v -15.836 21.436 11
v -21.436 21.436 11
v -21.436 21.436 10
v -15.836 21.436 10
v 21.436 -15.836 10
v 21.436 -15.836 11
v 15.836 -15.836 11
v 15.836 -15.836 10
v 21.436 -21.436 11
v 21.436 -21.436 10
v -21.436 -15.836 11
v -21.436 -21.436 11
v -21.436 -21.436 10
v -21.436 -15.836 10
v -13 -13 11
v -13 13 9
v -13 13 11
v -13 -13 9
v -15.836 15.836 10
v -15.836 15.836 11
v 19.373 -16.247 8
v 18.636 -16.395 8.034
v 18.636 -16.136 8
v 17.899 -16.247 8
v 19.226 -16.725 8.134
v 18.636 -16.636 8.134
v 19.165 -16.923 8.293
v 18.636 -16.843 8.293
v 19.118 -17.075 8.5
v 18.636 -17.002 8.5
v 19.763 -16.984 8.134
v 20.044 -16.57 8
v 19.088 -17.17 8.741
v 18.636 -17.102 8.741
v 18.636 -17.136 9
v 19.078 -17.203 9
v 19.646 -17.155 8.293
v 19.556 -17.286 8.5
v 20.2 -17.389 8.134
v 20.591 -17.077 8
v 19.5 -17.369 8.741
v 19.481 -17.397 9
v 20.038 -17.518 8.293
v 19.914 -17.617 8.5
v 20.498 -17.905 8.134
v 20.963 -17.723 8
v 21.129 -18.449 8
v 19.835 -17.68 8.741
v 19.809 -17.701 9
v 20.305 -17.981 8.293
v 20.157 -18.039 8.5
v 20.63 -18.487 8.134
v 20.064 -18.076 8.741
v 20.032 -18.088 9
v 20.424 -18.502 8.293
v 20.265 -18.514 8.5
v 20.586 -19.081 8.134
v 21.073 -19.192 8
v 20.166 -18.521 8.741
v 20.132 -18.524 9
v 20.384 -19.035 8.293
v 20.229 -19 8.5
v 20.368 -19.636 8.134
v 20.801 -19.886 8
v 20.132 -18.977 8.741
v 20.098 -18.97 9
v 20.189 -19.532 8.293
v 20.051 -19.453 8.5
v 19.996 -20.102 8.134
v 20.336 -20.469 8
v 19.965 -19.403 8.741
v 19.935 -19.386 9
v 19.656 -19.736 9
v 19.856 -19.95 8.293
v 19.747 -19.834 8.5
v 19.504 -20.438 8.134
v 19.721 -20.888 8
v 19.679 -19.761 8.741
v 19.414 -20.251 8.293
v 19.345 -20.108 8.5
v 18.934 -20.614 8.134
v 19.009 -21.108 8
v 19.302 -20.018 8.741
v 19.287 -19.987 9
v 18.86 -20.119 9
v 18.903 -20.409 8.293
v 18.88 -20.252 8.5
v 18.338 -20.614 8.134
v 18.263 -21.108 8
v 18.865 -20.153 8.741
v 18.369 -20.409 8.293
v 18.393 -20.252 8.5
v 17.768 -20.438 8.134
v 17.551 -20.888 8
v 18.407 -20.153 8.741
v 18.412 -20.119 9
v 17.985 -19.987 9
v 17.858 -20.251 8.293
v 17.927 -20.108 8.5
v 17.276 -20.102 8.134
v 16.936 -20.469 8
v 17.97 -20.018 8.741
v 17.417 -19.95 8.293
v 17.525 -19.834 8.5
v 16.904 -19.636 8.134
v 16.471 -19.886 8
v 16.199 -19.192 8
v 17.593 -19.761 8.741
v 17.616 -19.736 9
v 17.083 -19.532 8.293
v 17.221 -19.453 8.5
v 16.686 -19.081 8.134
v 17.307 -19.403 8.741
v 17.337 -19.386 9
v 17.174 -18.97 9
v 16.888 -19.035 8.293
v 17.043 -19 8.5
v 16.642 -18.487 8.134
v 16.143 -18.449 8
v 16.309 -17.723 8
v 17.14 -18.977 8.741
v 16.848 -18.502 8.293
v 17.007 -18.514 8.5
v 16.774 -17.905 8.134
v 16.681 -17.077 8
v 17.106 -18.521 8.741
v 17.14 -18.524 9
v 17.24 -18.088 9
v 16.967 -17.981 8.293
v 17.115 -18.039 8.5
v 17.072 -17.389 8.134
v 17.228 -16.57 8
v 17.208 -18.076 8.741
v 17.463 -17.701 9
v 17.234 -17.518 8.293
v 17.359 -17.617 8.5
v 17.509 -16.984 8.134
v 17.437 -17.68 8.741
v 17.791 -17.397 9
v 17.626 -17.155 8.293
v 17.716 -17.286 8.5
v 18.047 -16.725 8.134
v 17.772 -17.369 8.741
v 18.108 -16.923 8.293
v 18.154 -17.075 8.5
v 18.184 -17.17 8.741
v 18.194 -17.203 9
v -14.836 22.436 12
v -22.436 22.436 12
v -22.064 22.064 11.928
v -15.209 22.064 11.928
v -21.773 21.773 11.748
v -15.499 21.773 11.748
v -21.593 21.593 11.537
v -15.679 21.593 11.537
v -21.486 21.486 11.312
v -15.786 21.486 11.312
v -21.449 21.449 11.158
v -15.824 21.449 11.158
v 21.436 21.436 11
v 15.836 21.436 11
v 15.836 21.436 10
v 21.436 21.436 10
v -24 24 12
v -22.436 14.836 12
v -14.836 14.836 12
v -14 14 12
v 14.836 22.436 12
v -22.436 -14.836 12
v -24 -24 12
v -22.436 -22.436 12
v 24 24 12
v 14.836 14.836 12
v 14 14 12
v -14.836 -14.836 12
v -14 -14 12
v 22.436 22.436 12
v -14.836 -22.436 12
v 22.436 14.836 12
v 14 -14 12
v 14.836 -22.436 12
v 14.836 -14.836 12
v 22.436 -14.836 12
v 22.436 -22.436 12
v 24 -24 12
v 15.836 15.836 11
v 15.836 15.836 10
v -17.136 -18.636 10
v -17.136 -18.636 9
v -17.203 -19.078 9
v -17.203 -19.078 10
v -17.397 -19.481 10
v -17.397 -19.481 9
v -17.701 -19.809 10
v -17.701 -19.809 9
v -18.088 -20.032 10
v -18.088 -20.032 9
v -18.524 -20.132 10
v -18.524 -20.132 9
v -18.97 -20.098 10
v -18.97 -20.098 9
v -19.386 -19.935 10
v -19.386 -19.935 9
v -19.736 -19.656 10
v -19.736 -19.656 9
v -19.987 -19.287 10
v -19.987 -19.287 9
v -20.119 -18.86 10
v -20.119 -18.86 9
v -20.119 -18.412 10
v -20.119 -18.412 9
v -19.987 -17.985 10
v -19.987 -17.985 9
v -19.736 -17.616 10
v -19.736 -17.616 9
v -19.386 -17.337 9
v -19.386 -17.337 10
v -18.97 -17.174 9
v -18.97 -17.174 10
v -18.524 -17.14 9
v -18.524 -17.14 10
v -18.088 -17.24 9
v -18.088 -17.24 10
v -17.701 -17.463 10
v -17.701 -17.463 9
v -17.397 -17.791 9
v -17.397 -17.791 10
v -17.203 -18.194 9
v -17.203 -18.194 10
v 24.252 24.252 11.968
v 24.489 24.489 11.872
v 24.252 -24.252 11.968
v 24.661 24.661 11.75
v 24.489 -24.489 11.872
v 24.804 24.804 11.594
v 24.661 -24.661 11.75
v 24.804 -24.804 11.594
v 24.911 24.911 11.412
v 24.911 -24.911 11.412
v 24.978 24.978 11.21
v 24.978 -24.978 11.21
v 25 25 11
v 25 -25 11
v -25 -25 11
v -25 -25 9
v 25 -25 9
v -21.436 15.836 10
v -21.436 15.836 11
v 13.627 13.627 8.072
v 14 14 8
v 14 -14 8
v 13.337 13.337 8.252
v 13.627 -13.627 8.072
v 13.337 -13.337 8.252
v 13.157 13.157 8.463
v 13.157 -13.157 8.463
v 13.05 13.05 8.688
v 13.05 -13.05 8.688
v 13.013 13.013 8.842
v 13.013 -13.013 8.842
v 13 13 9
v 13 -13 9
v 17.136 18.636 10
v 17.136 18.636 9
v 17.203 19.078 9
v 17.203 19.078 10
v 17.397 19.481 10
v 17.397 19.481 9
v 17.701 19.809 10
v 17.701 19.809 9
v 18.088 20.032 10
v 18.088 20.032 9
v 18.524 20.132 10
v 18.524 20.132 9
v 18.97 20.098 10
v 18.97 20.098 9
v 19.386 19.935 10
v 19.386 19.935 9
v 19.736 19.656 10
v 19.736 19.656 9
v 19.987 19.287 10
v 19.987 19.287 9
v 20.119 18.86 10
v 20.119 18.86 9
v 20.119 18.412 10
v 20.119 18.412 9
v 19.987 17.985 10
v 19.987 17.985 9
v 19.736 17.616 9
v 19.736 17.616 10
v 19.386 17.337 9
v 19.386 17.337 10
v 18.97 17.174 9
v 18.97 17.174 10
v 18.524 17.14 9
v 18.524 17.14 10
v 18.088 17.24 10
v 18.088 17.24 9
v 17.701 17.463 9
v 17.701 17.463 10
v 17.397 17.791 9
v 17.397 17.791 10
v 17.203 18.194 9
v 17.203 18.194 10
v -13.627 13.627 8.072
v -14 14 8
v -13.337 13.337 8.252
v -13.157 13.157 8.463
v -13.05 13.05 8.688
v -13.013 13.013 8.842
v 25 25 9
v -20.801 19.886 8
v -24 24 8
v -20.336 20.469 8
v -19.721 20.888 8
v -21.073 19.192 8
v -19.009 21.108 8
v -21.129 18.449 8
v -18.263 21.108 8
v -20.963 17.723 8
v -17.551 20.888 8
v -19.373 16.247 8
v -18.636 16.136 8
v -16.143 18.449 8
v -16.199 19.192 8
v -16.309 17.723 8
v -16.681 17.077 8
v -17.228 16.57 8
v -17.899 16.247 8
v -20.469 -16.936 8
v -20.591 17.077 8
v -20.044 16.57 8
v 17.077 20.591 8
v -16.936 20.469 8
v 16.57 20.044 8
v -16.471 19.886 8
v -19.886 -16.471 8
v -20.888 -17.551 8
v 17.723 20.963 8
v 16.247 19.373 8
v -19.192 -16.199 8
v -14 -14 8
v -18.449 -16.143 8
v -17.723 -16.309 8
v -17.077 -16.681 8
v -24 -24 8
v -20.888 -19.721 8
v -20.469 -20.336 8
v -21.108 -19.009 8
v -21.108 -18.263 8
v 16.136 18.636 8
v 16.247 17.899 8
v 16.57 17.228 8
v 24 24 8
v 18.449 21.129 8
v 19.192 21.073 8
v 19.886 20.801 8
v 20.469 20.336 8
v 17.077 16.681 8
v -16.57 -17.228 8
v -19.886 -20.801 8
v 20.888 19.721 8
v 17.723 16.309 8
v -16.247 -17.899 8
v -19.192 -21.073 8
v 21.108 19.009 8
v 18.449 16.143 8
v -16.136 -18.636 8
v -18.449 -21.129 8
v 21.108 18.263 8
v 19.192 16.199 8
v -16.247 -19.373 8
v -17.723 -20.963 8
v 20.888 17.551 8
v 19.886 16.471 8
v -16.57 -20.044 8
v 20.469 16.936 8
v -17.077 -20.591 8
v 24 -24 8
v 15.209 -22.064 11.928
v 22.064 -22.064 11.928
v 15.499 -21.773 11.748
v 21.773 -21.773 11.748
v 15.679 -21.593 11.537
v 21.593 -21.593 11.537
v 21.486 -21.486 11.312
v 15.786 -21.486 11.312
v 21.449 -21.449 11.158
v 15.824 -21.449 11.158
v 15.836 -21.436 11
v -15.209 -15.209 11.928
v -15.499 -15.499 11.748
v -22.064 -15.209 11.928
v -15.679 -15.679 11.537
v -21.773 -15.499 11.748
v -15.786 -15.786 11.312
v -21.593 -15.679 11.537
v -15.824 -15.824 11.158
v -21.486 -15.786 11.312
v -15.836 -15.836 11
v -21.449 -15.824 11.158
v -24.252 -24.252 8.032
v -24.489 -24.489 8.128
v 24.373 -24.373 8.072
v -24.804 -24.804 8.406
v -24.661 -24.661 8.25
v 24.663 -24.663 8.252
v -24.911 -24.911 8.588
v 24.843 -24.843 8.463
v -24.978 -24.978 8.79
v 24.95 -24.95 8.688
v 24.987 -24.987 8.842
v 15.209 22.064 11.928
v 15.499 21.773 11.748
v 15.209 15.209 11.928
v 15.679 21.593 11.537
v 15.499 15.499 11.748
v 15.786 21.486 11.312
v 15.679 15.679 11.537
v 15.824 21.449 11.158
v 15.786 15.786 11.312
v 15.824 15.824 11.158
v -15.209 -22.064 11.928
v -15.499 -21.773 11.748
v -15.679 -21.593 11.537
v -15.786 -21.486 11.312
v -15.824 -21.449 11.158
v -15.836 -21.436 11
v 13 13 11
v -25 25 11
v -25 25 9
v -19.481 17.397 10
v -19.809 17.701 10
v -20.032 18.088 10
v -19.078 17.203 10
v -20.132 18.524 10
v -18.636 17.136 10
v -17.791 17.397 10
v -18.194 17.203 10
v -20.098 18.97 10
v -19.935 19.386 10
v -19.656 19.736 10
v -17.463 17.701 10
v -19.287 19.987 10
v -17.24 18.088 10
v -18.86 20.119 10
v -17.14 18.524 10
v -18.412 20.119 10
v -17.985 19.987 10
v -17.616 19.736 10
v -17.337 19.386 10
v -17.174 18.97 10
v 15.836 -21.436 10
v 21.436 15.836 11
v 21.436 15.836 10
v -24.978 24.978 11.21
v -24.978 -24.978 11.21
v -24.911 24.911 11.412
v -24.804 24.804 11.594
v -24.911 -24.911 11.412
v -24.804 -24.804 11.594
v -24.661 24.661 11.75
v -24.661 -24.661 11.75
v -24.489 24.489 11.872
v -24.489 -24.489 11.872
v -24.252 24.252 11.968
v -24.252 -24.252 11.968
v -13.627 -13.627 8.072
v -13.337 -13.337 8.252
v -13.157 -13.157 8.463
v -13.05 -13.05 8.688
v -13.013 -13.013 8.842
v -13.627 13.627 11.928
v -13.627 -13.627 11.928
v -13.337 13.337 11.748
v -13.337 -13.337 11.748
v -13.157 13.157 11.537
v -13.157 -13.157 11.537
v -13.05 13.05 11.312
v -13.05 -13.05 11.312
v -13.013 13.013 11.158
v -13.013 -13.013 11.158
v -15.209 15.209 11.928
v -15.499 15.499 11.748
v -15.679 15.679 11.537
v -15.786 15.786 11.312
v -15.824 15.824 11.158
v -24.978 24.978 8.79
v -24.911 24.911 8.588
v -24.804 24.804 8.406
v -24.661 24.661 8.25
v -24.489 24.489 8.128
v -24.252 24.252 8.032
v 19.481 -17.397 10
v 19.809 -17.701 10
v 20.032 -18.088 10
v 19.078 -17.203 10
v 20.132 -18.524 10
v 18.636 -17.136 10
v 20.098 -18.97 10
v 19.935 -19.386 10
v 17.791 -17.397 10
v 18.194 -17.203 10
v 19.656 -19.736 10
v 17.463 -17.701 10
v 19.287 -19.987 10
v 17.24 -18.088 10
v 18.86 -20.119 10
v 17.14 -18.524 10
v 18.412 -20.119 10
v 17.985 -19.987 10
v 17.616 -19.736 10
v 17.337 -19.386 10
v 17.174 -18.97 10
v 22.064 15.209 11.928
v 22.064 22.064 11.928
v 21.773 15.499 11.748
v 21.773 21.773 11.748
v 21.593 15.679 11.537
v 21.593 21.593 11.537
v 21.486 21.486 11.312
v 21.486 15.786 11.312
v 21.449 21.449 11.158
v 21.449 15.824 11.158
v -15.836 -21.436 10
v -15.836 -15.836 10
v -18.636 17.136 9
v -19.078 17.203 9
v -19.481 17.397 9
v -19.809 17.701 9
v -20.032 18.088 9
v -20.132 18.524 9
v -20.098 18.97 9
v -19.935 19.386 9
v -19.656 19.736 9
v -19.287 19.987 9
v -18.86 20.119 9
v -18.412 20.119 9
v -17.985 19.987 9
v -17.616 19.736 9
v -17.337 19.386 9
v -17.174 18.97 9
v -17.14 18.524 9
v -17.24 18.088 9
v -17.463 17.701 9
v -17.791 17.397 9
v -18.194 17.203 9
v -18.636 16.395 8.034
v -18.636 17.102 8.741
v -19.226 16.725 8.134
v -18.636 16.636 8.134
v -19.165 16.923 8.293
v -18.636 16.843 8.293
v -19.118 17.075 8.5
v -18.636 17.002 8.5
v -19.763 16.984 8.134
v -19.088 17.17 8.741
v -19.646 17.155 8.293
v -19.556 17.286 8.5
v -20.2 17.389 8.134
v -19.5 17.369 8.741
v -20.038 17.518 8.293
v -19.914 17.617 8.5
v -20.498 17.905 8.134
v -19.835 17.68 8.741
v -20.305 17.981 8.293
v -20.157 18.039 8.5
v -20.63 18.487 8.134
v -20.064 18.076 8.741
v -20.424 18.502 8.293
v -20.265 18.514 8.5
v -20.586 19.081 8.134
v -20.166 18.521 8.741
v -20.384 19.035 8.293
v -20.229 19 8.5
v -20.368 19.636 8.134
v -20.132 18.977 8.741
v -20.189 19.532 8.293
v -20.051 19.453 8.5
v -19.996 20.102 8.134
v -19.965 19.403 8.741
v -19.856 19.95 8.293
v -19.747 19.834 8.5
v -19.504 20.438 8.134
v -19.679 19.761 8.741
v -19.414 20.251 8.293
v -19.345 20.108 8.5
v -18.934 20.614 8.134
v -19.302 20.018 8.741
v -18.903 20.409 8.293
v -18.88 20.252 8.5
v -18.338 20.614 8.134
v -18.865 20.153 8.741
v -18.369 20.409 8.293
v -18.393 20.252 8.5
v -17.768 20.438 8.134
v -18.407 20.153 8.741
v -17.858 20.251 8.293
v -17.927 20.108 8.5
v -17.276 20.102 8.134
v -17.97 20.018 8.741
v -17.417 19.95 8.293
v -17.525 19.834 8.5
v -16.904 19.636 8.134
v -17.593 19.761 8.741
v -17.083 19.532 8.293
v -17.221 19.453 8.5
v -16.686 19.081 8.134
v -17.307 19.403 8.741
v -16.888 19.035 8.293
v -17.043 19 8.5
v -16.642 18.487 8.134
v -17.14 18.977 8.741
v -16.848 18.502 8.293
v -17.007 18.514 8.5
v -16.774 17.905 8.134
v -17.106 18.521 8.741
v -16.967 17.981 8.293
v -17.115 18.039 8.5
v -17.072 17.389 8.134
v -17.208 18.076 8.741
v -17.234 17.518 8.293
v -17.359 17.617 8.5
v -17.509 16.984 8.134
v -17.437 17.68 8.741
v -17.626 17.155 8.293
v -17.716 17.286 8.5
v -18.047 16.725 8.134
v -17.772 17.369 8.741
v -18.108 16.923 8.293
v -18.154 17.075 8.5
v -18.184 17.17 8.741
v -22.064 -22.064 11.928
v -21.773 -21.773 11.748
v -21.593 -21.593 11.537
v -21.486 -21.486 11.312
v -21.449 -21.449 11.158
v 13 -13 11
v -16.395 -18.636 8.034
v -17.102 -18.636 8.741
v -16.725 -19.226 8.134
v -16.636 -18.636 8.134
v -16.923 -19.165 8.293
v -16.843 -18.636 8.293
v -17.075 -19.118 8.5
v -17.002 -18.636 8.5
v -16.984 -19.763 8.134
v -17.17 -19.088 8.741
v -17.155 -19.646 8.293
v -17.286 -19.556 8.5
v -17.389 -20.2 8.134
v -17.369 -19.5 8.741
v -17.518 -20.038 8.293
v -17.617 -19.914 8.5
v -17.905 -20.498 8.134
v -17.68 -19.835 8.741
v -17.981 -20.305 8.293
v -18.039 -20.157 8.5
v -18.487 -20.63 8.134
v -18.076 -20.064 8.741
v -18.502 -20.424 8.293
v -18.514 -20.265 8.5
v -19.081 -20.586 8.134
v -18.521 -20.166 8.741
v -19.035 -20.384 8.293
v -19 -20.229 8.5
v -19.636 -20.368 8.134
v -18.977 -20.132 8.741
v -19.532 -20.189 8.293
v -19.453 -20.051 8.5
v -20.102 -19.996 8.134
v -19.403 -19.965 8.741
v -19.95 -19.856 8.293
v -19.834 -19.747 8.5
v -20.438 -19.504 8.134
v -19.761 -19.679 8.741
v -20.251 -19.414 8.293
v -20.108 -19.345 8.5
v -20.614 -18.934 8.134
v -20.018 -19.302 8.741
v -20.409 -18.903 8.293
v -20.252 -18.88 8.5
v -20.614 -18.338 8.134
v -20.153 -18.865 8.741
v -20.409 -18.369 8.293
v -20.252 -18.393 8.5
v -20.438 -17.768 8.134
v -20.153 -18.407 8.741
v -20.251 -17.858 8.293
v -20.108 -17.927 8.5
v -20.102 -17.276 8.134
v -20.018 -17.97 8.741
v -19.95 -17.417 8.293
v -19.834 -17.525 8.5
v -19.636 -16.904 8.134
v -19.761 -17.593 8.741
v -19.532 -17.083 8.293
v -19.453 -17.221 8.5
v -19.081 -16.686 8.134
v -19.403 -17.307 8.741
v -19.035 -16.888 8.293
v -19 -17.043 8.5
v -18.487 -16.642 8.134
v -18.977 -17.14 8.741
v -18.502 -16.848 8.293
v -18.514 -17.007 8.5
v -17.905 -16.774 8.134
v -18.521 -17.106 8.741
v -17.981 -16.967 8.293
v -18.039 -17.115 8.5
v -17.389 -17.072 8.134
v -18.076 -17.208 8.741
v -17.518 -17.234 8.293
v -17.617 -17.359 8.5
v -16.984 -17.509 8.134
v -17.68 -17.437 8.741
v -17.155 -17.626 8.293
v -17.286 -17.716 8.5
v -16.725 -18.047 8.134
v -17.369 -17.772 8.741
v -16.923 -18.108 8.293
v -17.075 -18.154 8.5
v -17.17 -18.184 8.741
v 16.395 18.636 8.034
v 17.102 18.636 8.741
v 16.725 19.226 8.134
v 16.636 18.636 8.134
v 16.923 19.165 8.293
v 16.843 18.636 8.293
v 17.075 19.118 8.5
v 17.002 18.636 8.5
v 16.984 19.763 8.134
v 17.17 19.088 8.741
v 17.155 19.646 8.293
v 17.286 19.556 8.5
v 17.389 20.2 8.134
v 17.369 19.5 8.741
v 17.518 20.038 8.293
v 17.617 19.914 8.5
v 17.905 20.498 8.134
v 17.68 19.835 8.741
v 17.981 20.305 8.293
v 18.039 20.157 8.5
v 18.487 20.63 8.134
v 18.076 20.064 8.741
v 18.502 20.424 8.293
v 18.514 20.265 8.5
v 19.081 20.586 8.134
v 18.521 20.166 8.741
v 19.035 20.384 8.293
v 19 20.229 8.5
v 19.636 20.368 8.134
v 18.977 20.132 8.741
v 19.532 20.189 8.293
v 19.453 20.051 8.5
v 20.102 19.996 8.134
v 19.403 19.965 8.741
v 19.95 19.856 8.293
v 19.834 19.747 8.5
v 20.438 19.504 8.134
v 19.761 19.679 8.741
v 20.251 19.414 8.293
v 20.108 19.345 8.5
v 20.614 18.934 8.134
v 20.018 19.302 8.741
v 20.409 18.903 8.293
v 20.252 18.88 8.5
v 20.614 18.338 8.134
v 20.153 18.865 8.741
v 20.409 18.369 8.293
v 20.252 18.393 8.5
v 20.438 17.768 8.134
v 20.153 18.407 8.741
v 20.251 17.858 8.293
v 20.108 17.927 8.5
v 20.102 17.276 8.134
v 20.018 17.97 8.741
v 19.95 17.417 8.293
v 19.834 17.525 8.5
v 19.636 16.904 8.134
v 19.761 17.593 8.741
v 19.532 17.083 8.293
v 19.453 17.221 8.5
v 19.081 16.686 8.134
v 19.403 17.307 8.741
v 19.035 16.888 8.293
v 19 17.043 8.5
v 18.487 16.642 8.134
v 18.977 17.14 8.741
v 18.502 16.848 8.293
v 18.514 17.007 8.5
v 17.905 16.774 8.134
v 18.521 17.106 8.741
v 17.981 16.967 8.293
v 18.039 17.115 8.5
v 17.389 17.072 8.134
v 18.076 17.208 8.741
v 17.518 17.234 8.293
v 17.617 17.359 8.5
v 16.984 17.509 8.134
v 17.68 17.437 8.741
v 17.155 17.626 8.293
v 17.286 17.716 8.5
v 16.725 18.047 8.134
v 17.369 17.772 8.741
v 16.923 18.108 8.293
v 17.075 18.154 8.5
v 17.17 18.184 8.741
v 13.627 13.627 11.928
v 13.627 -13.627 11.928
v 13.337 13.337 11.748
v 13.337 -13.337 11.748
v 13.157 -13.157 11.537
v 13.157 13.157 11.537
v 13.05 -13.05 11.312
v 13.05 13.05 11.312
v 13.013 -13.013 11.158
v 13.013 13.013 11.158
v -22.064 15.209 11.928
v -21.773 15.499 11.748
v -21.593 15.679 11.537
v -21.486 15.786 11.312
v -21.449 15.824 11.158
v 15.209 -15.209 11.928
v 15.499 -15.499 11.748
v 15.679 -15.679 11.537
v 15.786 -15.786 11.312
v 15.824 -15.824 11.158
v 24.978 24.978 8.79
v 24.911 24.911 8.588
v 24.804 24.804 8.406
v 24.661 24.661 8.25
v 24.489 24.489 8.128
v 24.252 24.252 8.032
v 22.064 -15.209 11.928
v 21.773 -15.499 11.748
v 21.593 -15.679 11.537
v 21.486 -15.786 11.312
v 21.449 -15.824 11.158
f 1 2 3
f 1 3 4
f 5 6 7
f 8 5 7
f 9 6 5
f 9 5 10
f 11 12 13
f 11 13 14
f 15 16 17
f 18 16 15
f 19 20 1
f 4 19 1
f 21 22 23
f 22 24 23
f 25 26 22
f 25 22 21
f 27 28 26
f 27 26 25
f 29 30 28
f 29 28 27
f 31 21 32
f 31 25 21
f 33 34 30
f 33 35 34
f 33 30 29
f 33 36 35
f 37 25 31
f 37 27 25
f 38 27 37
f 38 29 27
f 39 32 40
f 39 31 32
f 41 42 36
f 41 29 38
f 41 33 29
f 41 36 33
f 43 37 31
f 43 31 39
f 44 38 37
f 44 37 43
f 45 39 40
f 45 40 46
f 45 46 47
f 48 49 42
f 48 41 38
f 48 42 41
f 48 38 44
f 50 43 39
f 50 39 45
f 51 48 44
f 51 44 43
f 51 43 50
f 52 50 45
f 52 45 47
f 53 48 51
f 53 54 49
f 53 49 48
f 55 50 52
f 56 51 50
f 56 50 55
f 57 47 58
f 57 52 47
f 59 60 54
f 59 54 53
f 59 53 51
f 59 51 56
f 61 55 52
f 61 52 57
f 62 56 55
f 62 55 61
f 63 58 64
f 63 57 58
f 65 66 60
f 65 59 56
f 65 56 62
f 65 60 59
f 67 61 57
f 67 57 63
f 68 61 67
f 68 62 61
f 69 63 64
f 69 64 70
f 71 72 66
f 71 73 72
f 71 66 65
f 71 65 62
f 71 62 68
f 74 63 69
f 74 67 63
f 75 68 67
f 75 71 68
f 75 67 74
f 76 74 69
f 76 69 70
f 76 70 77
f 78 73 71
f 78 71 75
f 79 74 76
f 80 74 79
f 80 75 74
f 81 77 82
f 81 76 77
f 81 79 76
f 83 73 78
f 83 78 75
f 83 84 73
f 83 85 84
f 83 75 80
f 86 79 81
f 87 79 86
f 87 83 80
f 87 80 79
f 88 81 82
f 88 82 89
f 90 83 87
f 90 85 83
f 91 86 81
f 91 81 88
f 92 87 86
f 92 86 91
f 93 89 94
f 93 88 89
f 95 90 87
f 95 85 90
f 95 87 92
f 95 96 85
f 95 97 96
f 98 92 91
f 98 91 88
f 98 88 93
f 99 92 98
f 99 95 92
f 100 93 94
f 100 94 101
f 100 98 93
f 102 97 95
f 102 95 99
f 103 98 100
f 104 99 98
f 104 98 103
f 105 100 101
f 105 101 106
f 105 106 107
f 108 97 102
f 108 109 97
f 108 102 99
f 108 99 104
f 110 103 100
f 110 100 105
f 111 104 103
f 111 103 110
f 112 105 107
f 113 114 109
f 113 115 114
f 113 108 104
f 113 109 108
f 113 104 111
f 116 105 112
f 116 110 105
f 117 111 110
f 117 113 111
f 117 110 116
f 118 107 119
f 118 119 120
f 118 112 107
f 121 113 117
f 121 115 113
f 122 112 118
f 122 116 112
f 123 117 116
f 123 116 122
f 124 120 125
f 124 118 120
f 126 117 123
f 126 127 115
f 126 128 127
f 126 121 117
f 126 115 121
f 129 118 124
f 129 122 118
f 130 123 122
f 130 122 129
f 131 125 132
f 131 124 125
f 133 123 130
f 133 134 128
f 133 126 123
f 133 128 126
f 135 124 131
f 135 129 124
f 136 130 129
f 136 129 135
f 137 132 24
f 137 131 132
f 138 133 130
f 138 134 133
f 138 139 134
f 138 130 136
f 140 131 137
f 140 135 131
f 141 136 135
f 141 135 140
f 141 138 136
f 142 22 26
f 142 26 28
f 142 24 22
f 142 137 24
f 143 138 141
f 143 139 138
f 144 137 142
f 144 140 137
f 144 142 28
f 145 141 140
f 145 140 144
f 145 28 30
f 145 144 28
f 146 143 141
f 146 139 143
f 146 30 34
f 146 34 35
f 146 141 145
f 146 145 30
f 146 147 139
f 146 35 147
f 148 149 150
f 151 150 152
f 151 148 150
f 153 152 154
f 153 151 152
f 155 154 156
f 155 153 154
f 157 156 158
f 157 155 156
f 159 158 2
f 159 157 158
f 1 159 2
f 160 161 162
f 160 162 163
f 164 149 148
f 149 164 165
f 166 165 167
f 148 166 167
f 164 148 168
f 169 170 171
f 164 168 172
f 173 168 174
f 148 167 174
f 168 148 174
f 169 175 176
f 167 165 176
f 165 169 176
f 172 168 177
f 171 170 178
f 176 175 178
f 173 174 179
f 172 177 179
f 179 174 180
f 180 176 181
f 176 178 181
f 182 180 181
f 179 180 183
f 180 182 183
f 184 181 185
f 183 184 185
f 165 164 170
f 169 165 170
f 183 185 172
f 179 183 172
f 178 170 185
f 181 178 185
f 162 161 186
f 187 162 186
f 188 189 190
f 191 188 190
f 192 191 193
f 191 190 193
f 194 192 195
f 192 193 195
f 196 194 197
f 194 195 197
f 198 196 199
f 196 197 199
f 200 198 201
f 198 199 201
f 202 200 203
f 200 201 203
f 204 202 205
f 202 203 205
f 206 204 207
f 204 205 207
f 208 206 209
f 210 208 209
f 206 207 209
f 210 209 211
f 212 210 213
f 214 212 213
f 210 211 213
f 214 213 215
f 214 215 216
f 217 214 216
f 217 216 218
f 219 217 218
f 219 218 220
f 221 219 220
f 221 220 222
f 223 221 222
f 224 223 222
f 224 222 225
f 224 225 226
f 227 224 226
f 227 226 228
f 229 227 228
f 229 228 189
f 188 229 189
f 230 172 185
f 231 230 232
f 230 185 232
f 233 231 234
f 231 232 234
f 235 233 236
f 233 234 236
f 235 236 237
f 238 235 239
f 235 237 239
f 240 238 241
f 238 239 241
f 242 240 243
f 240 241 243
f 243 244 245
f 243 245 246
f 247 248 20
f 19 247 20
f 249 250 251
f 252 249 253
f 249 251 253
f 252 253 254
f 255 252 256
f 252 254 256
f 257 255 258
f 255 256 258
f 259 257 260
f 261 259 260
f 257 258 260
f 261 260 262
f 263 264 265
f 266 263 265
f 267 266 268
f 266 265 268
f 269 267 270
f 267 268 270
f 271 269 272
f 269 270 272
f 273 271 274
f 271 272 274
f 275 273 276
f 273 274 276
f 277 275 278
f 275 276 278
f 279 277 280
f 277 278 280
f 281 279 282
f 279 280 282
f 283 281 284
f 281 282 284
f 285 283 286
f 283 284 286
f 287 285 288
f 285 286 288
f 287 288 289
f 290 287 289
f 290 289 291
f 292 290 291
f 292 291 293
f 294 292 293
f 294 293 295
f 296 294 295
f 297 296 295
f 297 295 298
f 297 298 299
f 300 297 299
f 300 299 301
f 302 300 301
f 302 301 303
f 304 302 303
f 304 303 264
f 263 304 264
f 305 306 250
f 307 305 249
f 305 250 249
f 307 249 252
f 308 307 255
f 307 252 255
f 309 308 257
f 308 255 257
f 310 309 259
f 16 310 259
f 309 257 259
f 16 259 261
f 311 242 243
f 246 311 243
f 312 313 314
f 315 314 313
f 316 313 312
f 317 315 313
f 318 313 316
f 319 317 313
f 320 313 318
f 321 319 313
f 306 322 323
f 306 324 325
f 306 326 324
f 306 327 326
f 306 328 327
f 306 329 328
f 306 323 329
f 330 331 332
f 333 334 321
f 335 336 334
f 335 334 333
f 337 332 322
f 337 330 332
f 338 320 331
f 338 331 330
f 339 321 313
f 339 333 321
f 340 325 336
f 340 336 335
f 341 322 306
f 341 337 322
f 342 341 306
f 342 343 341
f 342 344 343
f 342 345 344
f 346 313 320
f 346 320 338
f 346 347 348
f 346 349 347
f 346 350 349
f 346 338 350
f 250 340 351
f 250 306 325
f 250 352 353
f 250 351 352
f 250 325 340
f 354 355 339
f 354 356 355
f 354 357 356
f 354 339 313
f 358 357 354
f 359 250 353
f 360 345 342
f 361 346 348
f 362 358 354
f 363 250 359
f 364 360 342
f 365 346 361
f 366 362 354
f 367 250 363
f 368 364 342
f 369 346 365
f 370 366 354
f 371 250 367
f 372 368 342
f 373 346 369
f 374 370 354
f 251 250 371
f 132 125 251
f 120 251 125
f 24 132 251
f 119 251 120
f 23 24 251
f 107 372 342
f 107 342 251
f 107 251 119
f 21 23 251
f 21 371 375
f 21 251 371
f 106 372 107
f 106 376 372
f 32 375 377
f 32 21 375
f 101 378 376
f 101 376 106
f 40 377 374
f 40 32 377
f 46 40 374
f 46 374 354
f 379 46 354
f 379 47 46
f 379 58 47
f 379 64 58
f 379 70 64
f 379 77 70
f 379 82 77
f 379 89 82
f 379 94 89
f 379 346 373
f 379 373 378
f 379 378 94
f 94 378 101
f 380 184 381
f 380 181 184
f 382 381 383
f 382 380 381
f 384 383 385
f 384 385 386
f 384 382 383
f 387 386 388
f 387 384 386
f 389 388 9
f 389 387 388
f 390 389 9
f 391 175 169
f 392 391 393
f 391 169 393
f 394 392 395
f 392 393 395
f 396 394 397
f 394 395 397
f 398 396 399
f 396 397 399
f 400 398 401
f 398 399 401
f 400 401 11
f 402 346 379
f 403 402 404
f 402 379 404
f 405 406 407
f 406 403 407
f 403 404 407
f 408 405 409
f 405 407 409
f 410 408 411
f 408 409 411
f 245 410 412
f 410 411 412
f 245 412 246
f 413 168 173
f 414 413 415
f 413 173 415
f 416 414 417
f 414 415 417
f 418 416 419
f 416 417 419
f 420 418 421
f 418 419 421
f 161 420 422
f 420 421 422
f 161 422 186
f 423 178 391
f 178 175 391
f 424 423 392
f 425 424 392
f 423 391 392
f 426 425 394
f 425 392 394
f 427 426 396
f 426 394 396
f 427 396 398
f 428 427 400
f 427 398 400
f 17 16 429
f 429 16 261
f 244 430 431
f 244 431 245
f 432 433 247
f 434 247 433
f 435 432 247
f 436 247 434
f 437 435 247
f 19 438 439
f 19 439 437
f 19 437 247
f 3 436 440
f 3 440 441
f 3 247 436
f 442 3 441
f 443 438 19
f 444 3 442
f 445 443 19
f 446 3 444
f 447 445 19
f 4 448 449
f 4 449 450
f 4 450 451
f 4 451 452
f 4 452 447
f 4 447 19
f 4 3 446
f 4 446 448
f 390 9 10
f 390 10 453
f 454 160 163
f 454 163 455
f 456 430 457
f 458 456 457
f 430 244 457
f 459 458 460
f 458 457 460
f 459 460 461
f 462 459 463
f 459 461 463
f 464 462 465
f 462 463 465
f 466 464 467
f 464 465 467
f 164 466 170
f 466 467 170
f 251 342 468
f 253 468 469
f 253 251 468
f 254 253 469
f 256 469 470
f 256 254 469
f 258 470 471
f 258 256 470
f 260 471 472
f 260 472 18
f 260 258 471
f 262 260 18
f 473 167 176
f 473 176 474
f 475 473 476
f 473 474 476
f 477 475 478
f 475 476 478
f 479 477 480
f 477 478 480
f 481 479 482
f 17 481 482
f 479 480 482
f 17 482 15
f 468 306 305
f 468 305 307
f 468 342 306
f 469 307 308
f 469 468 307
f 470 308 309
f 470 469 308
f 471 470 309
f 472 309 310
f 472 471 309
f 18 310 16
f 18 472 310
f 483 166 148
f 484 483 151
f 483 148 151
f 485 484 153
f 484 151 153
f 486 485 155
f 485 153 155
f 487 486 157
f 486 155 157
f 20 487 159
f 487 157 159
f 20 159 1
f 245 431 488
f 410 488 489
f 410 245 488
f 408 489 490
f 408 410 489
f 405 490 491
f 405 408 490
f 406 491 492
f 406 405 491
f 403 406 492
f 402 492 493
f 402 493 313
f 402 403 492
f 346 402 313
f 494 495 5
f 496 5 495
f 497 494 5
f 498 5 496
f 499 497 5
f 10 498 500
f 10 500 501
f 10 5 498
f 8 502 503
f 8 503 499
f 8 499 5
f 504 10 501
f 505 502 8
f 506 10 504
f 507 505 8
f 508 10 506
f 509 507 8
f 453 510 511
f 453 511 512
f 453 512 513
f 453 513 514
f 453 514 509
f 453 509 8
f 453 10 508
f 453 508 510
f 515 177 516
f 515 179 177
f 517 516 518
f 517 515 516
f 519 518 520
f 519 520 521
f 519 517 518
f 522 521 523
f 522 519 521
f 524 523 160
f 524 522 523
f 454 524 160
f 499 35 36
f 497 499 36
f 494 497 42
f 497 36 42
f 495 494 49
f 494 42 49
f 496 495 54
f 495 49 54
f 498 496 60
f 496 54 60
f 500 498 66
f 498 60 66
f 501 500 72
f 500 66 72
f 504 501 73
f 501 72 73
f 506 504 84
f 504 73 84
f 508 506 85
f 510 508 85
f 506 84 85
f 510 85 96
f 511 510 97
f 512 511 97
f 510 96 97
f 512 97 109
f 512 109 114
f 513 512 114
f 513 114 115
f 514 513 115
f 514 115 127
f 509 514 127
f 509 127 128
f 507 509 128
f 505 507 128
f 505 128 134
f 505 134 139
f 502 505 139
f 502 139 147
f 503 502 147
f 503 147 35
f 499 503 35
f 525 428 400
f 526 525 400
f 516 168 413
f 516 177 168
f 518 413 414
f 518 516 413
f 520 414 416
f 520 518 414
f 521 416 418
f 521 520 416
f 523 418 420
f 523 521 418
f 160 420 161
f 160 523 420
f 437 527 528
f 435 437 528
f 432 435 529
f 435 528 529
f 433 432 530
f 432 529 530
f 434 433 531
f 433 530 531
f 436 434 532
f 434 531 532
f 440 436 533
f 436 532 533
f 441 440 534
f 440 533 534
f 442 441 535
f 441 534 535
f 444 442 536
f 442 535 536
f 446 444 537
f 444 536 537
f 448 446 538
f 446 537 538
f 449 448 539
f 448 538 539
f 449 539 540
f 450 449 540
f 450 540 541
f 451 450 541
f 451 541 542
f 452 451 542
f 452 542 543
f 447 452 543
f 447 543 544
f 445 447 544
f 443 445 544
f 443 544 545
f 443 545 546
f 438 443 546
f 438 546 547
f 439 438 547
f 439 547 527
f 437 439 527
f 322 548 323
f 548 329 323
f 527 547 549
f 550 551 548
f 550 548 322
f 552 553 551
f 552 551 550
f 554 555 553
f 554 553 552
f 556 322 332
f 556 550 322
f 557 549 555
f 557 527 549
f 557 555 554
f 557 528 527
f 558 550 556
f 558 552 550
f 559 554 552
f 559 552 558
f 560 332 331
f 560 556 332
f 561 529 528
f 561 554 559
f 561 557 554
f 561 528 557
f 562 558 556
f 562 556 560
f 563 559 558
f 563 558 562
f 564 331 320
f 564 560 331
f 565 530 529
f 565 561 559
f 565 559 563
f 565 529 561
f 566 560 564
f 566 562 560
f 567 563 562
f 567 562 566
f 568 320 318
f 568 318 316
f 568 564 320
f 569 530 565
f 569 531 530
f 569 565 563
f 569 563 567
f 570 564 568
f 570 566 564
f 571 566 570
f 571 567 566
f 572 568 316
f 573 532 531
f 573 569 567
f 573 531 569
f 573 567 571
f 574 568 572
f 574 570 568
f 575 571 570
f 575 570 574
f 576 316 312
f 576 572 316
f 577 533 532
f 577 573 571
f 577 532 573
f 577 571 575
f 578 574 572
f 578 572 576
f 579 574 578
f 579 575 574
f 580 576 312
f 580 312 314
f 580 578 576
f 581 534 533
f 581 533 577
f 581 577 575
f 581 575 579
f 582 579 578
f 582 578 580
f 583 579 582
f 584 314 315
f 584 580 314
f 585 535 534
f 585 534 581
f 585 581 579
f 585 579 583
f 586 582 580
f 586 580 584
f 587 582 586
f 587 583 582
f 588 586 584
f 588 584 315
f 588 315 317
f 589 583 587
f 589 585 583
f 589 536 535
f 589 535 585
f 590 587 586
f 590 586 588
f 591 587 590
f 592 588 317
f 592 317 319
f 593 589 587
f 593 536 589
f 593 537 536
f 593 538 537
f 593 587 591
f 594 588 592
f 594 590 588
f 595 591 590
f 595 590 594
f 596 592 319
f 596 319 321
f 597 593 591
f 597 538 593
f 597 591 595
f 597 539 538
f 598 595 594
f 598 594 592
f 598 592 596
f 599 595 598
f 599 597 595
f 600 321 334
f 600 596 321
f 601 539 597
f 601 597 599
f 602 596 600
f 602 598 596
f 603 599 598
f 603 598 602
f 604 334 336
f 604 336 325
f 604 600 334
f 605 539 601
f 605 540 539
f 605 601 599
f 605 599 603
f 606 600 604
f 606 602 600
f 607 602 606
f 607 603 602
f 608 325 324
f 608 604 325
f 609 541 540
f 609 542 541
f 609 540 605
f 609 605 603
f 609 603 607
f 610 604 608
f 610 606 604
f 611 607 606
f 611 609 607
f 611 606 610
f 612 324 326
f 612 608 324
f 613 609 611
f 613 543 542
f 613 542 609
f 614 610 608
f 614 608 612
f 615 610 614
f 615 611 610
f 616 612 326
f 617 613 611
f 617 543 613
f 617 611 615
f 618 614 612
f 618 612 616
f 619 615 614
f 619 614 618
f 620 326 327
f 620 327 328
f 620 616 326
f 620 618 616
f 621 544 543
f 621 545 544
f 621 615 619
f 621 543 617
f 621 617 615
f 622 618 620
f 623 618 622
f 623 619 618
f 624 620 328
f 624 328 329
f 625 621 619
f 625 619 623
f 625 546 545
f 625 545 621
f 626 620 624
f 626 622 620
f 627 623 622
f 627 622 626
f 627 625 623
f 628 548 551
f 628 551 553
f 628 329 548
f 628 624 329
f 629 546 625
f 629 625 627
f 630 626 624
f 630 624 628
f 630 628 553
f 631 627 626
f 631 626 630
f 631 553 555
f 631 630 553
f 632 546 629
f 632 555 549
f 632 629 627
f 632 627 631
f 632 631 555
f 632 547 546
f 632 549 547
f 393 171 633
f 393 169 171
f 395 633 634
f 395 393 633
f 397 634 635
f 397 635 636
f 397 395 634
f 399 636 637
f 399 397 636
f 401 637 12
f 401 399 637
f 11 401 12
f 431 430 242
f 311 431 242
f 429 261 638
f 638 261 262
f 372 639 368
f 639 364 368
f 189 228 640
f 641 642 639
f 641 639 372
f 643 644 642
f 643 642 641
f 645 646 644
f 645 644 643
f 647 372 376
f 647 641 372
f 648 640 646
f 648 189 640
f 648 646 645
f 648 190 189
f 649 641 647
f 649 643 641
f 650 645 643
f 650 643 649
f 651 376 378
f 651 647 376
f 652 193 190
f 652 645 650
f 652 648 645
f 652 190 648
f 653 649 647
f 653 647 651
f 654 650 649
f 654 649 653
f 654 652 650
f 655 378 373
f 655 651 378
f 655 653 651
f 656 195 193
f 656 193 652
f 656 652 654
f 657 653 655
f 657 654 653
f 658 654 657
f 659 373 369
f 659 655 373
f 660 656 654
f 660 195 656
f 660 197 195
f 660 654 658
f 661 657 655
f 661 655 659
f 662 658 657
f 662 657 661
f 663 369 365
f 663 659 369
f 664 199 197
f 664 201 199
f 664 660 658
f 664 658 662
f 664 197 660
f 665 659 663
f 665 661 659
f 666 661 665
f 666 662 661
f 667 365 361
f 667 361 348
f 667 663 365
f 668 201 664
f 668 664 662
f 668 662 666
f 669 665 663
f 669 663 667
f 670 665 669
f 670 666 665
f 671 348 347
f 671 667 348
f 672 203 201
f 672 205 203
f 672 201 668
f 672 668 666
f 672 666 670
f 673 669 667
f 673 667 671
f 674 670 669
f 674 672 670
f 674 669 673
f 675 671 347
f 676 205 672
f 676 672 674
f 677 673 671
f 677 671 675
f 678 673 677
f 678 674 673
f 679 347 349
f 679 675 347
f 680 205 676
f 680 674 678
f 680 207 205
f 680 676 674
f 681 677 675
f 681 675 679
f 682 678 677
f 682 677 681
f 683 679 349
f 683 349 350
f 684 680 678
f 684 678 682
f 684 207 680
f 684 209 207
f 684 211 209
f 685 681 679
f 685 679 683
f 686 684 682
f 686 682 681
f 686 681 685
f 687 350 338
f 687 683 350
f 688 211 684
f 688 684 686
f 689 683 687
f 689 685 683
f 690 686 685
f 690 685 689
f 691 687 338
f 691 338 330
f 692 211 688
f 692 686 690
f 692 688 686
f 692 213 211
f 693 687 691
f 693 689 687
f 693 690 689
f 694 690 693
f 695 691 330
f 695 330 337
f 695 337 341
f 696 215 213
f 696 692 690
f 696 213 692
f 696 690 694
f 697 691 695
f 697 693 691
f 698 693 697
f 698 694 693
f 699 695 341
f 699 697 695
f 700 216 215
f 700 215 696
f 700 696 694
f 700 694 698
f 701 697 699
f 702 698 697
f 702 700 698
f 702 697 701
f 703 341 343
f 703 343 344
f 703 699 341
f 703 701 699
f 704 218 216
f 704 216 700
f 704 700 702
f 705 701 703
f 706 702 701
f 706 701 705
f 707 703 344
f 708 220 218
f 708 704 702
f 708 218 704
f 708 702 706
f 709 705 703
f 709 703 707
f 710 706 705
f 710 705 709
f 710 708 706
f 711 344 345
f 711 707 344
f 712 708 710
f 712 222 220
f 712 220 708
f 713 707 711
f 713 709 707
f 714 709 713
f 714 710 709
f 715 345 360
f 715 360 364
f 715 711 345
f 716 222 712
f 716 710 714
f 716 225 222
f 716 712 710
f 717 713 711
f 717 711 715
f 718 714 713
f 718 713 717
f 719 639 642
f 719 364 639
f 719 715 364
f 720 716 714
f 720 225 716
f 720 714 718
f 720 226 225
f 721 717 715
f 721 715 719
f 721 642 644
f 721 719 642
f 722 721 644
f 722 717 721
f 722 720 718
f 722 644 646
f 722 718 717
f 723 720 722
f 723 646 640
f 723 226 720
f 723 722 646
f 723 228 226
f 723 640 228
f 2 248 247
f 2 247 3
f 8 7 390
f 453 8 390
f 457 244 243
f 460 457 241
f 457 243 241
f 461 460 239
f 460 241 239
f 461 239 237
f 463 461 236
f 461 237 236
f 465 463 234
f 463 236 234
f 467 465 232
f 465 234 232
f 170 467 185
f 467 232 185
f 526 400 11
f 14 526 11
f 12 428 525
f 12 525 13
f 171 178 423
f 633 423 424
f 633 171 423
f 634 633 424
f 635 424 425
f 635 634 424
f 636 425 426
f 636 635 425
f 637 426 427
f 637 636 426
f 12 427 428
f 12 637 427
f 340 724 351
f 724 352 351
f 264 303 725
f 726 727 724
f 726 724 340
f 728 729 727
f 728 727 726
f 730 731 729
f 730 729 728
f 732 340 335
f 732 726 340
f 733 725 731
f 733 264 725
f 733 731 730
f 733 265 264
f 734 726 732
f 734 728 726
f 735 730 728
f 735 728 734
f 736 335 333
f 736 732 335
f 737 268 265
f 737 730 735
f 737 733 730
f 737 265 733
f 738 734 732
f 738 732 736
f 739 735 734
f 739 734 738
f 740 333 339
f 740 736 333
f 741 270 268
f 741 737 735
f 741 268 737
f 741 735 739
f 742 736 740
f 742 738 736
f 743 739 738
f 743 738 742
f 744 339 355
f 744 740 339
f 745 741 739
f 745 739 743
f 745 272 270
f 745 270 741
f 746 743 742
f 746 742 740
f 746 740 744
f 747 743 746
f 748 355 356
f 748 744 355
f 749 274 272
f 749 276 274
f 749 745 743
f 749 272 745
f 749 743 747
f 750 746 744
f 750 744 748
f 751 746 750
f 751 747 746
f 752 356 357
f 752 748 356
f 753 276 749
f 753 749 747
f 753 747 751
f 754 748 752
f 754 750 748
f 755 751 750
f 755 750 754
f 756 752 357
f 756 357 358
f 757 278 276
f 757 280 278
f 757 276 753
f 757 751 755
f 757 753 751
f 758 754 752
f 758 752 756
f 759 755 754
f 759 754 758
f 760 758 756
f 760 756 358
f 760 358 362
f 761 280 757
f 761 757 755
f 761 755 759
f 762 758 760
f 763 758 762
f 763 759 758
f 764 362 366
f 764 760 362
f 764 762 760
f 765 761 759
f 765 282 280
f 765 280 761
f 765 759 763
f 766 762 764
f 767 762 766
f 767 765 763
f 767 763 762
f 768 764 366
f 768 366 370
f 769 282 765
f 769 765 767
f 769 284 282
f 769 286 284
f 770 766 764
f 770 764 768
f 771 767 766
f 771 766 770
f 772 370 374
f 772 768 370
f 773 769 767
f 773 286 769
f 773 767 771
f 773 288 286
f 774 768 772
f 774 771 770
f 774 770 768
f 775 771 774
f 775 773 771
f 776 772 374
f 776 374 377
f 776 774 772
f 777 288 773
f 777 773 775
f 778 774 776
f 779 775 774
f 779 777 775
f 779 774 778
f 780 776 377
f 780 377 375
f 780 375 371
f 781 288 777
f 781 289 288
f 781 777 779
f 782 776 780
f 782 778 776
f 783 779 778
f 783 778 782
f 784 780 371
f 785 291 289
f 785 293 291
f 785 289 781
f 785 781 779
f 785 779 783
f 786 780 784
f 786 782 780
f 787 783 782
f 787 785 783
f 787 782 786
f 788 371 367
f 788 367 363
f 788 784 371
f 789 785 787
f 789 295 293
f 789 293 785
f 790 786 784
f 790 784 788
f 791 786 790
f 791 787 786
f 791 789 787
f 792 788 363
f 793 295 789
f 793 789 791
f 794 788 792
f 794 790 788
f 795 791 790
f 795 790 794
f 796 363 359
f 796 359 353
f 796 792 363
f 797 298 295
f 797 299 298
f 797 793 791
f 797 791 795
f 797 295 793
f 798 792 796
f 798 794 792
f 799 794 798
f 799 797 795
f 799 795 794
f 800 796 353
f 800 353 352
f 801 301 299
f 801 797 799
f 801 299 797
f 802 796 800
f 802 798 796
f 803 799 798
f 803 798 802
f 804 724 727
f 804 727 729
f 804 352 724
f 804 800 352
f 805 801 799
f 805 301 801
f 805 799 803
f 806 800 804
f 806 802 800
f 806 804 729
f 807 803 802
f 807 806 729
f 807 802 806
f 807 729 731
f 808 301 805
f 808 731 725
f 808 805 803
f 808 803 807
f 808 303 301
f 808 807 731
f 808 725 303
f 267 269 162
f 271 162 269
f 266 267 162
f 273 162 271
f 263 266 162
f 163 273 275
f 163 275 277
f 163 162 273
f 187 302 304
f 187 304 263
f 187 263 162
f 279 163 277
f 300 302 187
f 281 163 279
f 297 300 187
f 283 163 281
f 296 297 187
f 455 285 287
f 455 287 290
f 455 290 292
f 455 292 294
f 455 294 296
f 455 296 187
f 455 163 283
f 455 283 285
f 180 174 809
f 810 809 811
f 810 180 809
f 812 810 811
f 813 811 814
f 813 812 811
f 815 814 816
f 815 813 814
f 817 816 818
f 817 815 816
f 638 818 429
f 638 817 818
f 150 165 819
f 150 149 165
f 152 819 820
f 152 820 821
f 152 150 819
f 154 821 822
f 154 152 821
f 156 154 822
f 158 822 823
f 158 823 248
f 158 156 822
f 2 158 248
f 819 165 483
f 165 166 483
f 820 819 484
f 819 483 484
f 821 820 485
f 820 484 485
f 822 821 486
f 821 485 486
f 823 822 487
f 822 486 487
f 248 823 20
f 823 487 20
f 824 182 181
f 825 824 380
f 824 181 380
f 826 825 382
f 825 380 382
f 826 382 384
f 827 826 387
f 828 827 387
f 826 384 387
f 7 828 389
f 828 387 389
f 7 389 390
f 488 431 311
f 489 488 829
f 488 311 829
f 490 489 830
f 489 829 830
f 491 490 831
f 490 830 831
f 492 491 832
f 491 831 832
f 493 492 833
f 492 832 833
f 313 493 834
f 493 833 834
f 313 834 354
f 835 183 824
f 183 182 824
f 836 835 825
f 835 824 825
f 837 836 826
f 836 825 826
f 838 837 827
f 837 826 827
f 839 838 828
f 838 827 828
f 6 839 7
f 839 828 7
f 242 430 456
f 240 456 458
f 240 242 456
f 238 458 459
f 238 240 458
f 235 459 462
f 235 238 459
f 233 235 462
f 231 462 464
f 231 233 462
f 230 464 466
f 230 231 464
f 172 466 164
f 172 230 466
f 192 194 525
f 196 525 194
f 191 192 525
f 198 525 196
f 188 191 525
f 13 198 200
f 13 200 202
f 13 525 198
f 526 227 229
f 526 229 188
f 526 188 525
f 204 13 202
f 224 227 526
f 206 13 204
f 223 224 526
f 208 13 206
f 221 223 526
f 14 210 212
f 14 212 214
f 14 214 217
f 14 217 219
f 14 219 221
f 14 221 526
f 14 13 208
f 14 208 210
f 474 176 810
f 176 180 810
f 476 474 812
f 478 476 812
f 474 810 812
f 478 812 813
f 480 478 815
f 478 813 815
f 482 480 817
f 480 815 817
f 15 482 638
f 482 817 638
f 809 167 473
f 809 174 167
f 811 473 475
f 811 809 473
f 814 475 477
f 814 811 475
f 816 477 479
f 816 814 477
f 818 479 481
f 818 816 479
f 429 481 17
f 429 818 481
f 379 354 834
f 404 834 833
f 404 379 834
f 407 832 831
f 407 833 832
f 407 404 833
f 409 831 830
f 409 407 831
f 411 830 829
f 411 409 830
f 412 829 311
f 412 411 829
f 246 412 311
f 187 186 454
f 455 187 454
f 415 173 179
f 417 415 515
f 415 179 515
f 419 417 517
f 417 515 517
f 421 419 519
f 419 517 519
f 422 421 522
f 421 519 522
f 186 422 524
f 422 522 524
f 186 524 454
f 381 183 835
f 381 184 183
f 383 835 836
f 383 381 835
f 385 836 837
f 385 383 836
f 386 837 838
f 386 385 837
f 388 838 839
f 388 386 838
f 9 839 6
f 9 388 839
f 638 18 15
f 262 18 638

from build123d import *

# Parameters (mm, degrees)
SKETCH004_W             = 50
SKETCH004_H             = 50
PAD002_DEPTH            = 4
SKETCH005_W             = 26
SKETCH005_H             = 26
POCKET_DEPTH            = 10
SKETCH006_R             = 1.5
HOLE002_DEPTH           = 5
POLARPATTERN001_COUNT   = 4
SKETCH007_W             = 5.6
SKETCH007_H             = 5.6
POCKET001_DEPTH         = 2
POLARPATTERN002_COUNT   = 4
FILLET013_R             = 1
FILLET014_R             = 1
BODY001_PLACEMENT_ANGLE = 180


with BuildPart() as part:
    # Sketch004 → Pad002 (new body)
    with BuildSketch(Plane.XY):
        Rectangle(SKETCH004_W, SKETCH004_H)
    extrude(amount=PAD002_DEPTH)

    # Sketch005 (on Face6 of Pad002) → Pocket (cut)
    with BuildSketch(Plane.XY.offset(4)):
        Rectangle(SKETCH005_W, SKETCH005_H)
    extrude(amount=-POCKET_DEPTH, mode=Mode.SUBTRACT)

    # Sketch006 (on Face5 of Pocket) → Hole002 (cut)
    with BuildSketch(Plane.XY.offset(4)):
        with Locations((-18.636039, 18.636039)):
            Circle(SKETCH006_R)
    hole002 = extrude(amount=-HOLE002_DEPTH, mode=Mode.SUBTRACT)

    # PolarPattern001: Hole002 ×4 about axis
    polarpattern001_axis = Axis((0, 0, 4), (0, 0, 1))
    for i in range(1, POLARPATTERN001_COUNT):
        add(hole002.rotate(polarpattern001_axis, i * 360 / POLARPATTERN001_COUNT), mode=Mode.SUBTRACT)

    # Sketch007 (on Face4 of PolarPattern001) → Pocket001 (cut)
    with BuildSketch(Plane(origin=(0, 0, 0), x_dir=(1, 0, 0), z_dir=(0, 0, -1))):
        with Locations((-18.636039, 18.636039)):
            Rectangle(SKETCH007_W, SKETCH007_H)
    pocket001 = extrude(amount=-POCKET001_DEPTH, mode=Mode.SUBTRACT)

    # PolarPattern002: Pocket001 ×4 about axis
    polarpattern002_axis = Axis((0, 0, 0), (0, 0, -1))
    for i in range(1, POLARPATTERN002_COUNT):
        add(pocket001.rotate(polarpattern002_axis, i * 360 / POLARPATTERN002_COUNT), mode=Mode.SUBTRACT)

    # Fillet013
    fillet013_edges = [part.edges().sort_by_distance(p)[0] for p in [
        (-25, 0, 0),
        (0, -25, 0),
        (0, 25, 0),
        (25, 0, 0),
        (-18.636039, -21.436039, 0),
        (-15.836039, -18.636039, 0),
        (-21.436039, -18.636039, 0),
        (-18.636039, -15.836039, 0),
        (21.436039, -18.636039, 0),
        (18.636039, -15.836039, 0),
        (15.836039, -18.636039, 0),
        (18.636039, -21.436039, 0),
        (0, -13, 0),
        (13, 0, 0),
        (-13, 0, 0),
        (0, 13, 0),
        (-21.436039, 18.636039, 0),
        (-18.636039, 15.836039, 0),
        (-15.836039, 18.636039, 0),
        (-18.636039, 21.436039, 0),
        (18.636039, 21.436039, 0),
        (15.836039, 18.636039, 0),
        (18.636039, 15.836039, 0),
        (21.436039, 18.636039, 0),
    ]]
    fillet(fillet013_edges, radius=FILLET013_R)

    # Fillet014
    fillet014_edges = [part.edges().sort_by_distance(p)[0] for p in [
        (-25, 0, 4),
        (0, -25, 4),
        (0, 25, 4),
        (25, 0, 4),
        (-18.636039, -20.136039, 4),
        (20.136039, -18.636039, 4),
        (-20.136039, 18.636039, 4),
        (0, -13, 4),
        (13, 0, 4),
        (-13, 0, 4),
        (0, 13, 4),
        (18.636039, 20.136039, 4),
    ]]
    fillet(fillet014_edges, radius=FILLET014_R)


with BuildPart() as part_1:
    # Body001 placement: moved
    add(part.part.moved(Location((0, 0, 12))).rotate(Axis((0, 0, 12), (1, 0, 0)), BODY001_PLACEMENT_ANGLE))


solid = part_1.part
